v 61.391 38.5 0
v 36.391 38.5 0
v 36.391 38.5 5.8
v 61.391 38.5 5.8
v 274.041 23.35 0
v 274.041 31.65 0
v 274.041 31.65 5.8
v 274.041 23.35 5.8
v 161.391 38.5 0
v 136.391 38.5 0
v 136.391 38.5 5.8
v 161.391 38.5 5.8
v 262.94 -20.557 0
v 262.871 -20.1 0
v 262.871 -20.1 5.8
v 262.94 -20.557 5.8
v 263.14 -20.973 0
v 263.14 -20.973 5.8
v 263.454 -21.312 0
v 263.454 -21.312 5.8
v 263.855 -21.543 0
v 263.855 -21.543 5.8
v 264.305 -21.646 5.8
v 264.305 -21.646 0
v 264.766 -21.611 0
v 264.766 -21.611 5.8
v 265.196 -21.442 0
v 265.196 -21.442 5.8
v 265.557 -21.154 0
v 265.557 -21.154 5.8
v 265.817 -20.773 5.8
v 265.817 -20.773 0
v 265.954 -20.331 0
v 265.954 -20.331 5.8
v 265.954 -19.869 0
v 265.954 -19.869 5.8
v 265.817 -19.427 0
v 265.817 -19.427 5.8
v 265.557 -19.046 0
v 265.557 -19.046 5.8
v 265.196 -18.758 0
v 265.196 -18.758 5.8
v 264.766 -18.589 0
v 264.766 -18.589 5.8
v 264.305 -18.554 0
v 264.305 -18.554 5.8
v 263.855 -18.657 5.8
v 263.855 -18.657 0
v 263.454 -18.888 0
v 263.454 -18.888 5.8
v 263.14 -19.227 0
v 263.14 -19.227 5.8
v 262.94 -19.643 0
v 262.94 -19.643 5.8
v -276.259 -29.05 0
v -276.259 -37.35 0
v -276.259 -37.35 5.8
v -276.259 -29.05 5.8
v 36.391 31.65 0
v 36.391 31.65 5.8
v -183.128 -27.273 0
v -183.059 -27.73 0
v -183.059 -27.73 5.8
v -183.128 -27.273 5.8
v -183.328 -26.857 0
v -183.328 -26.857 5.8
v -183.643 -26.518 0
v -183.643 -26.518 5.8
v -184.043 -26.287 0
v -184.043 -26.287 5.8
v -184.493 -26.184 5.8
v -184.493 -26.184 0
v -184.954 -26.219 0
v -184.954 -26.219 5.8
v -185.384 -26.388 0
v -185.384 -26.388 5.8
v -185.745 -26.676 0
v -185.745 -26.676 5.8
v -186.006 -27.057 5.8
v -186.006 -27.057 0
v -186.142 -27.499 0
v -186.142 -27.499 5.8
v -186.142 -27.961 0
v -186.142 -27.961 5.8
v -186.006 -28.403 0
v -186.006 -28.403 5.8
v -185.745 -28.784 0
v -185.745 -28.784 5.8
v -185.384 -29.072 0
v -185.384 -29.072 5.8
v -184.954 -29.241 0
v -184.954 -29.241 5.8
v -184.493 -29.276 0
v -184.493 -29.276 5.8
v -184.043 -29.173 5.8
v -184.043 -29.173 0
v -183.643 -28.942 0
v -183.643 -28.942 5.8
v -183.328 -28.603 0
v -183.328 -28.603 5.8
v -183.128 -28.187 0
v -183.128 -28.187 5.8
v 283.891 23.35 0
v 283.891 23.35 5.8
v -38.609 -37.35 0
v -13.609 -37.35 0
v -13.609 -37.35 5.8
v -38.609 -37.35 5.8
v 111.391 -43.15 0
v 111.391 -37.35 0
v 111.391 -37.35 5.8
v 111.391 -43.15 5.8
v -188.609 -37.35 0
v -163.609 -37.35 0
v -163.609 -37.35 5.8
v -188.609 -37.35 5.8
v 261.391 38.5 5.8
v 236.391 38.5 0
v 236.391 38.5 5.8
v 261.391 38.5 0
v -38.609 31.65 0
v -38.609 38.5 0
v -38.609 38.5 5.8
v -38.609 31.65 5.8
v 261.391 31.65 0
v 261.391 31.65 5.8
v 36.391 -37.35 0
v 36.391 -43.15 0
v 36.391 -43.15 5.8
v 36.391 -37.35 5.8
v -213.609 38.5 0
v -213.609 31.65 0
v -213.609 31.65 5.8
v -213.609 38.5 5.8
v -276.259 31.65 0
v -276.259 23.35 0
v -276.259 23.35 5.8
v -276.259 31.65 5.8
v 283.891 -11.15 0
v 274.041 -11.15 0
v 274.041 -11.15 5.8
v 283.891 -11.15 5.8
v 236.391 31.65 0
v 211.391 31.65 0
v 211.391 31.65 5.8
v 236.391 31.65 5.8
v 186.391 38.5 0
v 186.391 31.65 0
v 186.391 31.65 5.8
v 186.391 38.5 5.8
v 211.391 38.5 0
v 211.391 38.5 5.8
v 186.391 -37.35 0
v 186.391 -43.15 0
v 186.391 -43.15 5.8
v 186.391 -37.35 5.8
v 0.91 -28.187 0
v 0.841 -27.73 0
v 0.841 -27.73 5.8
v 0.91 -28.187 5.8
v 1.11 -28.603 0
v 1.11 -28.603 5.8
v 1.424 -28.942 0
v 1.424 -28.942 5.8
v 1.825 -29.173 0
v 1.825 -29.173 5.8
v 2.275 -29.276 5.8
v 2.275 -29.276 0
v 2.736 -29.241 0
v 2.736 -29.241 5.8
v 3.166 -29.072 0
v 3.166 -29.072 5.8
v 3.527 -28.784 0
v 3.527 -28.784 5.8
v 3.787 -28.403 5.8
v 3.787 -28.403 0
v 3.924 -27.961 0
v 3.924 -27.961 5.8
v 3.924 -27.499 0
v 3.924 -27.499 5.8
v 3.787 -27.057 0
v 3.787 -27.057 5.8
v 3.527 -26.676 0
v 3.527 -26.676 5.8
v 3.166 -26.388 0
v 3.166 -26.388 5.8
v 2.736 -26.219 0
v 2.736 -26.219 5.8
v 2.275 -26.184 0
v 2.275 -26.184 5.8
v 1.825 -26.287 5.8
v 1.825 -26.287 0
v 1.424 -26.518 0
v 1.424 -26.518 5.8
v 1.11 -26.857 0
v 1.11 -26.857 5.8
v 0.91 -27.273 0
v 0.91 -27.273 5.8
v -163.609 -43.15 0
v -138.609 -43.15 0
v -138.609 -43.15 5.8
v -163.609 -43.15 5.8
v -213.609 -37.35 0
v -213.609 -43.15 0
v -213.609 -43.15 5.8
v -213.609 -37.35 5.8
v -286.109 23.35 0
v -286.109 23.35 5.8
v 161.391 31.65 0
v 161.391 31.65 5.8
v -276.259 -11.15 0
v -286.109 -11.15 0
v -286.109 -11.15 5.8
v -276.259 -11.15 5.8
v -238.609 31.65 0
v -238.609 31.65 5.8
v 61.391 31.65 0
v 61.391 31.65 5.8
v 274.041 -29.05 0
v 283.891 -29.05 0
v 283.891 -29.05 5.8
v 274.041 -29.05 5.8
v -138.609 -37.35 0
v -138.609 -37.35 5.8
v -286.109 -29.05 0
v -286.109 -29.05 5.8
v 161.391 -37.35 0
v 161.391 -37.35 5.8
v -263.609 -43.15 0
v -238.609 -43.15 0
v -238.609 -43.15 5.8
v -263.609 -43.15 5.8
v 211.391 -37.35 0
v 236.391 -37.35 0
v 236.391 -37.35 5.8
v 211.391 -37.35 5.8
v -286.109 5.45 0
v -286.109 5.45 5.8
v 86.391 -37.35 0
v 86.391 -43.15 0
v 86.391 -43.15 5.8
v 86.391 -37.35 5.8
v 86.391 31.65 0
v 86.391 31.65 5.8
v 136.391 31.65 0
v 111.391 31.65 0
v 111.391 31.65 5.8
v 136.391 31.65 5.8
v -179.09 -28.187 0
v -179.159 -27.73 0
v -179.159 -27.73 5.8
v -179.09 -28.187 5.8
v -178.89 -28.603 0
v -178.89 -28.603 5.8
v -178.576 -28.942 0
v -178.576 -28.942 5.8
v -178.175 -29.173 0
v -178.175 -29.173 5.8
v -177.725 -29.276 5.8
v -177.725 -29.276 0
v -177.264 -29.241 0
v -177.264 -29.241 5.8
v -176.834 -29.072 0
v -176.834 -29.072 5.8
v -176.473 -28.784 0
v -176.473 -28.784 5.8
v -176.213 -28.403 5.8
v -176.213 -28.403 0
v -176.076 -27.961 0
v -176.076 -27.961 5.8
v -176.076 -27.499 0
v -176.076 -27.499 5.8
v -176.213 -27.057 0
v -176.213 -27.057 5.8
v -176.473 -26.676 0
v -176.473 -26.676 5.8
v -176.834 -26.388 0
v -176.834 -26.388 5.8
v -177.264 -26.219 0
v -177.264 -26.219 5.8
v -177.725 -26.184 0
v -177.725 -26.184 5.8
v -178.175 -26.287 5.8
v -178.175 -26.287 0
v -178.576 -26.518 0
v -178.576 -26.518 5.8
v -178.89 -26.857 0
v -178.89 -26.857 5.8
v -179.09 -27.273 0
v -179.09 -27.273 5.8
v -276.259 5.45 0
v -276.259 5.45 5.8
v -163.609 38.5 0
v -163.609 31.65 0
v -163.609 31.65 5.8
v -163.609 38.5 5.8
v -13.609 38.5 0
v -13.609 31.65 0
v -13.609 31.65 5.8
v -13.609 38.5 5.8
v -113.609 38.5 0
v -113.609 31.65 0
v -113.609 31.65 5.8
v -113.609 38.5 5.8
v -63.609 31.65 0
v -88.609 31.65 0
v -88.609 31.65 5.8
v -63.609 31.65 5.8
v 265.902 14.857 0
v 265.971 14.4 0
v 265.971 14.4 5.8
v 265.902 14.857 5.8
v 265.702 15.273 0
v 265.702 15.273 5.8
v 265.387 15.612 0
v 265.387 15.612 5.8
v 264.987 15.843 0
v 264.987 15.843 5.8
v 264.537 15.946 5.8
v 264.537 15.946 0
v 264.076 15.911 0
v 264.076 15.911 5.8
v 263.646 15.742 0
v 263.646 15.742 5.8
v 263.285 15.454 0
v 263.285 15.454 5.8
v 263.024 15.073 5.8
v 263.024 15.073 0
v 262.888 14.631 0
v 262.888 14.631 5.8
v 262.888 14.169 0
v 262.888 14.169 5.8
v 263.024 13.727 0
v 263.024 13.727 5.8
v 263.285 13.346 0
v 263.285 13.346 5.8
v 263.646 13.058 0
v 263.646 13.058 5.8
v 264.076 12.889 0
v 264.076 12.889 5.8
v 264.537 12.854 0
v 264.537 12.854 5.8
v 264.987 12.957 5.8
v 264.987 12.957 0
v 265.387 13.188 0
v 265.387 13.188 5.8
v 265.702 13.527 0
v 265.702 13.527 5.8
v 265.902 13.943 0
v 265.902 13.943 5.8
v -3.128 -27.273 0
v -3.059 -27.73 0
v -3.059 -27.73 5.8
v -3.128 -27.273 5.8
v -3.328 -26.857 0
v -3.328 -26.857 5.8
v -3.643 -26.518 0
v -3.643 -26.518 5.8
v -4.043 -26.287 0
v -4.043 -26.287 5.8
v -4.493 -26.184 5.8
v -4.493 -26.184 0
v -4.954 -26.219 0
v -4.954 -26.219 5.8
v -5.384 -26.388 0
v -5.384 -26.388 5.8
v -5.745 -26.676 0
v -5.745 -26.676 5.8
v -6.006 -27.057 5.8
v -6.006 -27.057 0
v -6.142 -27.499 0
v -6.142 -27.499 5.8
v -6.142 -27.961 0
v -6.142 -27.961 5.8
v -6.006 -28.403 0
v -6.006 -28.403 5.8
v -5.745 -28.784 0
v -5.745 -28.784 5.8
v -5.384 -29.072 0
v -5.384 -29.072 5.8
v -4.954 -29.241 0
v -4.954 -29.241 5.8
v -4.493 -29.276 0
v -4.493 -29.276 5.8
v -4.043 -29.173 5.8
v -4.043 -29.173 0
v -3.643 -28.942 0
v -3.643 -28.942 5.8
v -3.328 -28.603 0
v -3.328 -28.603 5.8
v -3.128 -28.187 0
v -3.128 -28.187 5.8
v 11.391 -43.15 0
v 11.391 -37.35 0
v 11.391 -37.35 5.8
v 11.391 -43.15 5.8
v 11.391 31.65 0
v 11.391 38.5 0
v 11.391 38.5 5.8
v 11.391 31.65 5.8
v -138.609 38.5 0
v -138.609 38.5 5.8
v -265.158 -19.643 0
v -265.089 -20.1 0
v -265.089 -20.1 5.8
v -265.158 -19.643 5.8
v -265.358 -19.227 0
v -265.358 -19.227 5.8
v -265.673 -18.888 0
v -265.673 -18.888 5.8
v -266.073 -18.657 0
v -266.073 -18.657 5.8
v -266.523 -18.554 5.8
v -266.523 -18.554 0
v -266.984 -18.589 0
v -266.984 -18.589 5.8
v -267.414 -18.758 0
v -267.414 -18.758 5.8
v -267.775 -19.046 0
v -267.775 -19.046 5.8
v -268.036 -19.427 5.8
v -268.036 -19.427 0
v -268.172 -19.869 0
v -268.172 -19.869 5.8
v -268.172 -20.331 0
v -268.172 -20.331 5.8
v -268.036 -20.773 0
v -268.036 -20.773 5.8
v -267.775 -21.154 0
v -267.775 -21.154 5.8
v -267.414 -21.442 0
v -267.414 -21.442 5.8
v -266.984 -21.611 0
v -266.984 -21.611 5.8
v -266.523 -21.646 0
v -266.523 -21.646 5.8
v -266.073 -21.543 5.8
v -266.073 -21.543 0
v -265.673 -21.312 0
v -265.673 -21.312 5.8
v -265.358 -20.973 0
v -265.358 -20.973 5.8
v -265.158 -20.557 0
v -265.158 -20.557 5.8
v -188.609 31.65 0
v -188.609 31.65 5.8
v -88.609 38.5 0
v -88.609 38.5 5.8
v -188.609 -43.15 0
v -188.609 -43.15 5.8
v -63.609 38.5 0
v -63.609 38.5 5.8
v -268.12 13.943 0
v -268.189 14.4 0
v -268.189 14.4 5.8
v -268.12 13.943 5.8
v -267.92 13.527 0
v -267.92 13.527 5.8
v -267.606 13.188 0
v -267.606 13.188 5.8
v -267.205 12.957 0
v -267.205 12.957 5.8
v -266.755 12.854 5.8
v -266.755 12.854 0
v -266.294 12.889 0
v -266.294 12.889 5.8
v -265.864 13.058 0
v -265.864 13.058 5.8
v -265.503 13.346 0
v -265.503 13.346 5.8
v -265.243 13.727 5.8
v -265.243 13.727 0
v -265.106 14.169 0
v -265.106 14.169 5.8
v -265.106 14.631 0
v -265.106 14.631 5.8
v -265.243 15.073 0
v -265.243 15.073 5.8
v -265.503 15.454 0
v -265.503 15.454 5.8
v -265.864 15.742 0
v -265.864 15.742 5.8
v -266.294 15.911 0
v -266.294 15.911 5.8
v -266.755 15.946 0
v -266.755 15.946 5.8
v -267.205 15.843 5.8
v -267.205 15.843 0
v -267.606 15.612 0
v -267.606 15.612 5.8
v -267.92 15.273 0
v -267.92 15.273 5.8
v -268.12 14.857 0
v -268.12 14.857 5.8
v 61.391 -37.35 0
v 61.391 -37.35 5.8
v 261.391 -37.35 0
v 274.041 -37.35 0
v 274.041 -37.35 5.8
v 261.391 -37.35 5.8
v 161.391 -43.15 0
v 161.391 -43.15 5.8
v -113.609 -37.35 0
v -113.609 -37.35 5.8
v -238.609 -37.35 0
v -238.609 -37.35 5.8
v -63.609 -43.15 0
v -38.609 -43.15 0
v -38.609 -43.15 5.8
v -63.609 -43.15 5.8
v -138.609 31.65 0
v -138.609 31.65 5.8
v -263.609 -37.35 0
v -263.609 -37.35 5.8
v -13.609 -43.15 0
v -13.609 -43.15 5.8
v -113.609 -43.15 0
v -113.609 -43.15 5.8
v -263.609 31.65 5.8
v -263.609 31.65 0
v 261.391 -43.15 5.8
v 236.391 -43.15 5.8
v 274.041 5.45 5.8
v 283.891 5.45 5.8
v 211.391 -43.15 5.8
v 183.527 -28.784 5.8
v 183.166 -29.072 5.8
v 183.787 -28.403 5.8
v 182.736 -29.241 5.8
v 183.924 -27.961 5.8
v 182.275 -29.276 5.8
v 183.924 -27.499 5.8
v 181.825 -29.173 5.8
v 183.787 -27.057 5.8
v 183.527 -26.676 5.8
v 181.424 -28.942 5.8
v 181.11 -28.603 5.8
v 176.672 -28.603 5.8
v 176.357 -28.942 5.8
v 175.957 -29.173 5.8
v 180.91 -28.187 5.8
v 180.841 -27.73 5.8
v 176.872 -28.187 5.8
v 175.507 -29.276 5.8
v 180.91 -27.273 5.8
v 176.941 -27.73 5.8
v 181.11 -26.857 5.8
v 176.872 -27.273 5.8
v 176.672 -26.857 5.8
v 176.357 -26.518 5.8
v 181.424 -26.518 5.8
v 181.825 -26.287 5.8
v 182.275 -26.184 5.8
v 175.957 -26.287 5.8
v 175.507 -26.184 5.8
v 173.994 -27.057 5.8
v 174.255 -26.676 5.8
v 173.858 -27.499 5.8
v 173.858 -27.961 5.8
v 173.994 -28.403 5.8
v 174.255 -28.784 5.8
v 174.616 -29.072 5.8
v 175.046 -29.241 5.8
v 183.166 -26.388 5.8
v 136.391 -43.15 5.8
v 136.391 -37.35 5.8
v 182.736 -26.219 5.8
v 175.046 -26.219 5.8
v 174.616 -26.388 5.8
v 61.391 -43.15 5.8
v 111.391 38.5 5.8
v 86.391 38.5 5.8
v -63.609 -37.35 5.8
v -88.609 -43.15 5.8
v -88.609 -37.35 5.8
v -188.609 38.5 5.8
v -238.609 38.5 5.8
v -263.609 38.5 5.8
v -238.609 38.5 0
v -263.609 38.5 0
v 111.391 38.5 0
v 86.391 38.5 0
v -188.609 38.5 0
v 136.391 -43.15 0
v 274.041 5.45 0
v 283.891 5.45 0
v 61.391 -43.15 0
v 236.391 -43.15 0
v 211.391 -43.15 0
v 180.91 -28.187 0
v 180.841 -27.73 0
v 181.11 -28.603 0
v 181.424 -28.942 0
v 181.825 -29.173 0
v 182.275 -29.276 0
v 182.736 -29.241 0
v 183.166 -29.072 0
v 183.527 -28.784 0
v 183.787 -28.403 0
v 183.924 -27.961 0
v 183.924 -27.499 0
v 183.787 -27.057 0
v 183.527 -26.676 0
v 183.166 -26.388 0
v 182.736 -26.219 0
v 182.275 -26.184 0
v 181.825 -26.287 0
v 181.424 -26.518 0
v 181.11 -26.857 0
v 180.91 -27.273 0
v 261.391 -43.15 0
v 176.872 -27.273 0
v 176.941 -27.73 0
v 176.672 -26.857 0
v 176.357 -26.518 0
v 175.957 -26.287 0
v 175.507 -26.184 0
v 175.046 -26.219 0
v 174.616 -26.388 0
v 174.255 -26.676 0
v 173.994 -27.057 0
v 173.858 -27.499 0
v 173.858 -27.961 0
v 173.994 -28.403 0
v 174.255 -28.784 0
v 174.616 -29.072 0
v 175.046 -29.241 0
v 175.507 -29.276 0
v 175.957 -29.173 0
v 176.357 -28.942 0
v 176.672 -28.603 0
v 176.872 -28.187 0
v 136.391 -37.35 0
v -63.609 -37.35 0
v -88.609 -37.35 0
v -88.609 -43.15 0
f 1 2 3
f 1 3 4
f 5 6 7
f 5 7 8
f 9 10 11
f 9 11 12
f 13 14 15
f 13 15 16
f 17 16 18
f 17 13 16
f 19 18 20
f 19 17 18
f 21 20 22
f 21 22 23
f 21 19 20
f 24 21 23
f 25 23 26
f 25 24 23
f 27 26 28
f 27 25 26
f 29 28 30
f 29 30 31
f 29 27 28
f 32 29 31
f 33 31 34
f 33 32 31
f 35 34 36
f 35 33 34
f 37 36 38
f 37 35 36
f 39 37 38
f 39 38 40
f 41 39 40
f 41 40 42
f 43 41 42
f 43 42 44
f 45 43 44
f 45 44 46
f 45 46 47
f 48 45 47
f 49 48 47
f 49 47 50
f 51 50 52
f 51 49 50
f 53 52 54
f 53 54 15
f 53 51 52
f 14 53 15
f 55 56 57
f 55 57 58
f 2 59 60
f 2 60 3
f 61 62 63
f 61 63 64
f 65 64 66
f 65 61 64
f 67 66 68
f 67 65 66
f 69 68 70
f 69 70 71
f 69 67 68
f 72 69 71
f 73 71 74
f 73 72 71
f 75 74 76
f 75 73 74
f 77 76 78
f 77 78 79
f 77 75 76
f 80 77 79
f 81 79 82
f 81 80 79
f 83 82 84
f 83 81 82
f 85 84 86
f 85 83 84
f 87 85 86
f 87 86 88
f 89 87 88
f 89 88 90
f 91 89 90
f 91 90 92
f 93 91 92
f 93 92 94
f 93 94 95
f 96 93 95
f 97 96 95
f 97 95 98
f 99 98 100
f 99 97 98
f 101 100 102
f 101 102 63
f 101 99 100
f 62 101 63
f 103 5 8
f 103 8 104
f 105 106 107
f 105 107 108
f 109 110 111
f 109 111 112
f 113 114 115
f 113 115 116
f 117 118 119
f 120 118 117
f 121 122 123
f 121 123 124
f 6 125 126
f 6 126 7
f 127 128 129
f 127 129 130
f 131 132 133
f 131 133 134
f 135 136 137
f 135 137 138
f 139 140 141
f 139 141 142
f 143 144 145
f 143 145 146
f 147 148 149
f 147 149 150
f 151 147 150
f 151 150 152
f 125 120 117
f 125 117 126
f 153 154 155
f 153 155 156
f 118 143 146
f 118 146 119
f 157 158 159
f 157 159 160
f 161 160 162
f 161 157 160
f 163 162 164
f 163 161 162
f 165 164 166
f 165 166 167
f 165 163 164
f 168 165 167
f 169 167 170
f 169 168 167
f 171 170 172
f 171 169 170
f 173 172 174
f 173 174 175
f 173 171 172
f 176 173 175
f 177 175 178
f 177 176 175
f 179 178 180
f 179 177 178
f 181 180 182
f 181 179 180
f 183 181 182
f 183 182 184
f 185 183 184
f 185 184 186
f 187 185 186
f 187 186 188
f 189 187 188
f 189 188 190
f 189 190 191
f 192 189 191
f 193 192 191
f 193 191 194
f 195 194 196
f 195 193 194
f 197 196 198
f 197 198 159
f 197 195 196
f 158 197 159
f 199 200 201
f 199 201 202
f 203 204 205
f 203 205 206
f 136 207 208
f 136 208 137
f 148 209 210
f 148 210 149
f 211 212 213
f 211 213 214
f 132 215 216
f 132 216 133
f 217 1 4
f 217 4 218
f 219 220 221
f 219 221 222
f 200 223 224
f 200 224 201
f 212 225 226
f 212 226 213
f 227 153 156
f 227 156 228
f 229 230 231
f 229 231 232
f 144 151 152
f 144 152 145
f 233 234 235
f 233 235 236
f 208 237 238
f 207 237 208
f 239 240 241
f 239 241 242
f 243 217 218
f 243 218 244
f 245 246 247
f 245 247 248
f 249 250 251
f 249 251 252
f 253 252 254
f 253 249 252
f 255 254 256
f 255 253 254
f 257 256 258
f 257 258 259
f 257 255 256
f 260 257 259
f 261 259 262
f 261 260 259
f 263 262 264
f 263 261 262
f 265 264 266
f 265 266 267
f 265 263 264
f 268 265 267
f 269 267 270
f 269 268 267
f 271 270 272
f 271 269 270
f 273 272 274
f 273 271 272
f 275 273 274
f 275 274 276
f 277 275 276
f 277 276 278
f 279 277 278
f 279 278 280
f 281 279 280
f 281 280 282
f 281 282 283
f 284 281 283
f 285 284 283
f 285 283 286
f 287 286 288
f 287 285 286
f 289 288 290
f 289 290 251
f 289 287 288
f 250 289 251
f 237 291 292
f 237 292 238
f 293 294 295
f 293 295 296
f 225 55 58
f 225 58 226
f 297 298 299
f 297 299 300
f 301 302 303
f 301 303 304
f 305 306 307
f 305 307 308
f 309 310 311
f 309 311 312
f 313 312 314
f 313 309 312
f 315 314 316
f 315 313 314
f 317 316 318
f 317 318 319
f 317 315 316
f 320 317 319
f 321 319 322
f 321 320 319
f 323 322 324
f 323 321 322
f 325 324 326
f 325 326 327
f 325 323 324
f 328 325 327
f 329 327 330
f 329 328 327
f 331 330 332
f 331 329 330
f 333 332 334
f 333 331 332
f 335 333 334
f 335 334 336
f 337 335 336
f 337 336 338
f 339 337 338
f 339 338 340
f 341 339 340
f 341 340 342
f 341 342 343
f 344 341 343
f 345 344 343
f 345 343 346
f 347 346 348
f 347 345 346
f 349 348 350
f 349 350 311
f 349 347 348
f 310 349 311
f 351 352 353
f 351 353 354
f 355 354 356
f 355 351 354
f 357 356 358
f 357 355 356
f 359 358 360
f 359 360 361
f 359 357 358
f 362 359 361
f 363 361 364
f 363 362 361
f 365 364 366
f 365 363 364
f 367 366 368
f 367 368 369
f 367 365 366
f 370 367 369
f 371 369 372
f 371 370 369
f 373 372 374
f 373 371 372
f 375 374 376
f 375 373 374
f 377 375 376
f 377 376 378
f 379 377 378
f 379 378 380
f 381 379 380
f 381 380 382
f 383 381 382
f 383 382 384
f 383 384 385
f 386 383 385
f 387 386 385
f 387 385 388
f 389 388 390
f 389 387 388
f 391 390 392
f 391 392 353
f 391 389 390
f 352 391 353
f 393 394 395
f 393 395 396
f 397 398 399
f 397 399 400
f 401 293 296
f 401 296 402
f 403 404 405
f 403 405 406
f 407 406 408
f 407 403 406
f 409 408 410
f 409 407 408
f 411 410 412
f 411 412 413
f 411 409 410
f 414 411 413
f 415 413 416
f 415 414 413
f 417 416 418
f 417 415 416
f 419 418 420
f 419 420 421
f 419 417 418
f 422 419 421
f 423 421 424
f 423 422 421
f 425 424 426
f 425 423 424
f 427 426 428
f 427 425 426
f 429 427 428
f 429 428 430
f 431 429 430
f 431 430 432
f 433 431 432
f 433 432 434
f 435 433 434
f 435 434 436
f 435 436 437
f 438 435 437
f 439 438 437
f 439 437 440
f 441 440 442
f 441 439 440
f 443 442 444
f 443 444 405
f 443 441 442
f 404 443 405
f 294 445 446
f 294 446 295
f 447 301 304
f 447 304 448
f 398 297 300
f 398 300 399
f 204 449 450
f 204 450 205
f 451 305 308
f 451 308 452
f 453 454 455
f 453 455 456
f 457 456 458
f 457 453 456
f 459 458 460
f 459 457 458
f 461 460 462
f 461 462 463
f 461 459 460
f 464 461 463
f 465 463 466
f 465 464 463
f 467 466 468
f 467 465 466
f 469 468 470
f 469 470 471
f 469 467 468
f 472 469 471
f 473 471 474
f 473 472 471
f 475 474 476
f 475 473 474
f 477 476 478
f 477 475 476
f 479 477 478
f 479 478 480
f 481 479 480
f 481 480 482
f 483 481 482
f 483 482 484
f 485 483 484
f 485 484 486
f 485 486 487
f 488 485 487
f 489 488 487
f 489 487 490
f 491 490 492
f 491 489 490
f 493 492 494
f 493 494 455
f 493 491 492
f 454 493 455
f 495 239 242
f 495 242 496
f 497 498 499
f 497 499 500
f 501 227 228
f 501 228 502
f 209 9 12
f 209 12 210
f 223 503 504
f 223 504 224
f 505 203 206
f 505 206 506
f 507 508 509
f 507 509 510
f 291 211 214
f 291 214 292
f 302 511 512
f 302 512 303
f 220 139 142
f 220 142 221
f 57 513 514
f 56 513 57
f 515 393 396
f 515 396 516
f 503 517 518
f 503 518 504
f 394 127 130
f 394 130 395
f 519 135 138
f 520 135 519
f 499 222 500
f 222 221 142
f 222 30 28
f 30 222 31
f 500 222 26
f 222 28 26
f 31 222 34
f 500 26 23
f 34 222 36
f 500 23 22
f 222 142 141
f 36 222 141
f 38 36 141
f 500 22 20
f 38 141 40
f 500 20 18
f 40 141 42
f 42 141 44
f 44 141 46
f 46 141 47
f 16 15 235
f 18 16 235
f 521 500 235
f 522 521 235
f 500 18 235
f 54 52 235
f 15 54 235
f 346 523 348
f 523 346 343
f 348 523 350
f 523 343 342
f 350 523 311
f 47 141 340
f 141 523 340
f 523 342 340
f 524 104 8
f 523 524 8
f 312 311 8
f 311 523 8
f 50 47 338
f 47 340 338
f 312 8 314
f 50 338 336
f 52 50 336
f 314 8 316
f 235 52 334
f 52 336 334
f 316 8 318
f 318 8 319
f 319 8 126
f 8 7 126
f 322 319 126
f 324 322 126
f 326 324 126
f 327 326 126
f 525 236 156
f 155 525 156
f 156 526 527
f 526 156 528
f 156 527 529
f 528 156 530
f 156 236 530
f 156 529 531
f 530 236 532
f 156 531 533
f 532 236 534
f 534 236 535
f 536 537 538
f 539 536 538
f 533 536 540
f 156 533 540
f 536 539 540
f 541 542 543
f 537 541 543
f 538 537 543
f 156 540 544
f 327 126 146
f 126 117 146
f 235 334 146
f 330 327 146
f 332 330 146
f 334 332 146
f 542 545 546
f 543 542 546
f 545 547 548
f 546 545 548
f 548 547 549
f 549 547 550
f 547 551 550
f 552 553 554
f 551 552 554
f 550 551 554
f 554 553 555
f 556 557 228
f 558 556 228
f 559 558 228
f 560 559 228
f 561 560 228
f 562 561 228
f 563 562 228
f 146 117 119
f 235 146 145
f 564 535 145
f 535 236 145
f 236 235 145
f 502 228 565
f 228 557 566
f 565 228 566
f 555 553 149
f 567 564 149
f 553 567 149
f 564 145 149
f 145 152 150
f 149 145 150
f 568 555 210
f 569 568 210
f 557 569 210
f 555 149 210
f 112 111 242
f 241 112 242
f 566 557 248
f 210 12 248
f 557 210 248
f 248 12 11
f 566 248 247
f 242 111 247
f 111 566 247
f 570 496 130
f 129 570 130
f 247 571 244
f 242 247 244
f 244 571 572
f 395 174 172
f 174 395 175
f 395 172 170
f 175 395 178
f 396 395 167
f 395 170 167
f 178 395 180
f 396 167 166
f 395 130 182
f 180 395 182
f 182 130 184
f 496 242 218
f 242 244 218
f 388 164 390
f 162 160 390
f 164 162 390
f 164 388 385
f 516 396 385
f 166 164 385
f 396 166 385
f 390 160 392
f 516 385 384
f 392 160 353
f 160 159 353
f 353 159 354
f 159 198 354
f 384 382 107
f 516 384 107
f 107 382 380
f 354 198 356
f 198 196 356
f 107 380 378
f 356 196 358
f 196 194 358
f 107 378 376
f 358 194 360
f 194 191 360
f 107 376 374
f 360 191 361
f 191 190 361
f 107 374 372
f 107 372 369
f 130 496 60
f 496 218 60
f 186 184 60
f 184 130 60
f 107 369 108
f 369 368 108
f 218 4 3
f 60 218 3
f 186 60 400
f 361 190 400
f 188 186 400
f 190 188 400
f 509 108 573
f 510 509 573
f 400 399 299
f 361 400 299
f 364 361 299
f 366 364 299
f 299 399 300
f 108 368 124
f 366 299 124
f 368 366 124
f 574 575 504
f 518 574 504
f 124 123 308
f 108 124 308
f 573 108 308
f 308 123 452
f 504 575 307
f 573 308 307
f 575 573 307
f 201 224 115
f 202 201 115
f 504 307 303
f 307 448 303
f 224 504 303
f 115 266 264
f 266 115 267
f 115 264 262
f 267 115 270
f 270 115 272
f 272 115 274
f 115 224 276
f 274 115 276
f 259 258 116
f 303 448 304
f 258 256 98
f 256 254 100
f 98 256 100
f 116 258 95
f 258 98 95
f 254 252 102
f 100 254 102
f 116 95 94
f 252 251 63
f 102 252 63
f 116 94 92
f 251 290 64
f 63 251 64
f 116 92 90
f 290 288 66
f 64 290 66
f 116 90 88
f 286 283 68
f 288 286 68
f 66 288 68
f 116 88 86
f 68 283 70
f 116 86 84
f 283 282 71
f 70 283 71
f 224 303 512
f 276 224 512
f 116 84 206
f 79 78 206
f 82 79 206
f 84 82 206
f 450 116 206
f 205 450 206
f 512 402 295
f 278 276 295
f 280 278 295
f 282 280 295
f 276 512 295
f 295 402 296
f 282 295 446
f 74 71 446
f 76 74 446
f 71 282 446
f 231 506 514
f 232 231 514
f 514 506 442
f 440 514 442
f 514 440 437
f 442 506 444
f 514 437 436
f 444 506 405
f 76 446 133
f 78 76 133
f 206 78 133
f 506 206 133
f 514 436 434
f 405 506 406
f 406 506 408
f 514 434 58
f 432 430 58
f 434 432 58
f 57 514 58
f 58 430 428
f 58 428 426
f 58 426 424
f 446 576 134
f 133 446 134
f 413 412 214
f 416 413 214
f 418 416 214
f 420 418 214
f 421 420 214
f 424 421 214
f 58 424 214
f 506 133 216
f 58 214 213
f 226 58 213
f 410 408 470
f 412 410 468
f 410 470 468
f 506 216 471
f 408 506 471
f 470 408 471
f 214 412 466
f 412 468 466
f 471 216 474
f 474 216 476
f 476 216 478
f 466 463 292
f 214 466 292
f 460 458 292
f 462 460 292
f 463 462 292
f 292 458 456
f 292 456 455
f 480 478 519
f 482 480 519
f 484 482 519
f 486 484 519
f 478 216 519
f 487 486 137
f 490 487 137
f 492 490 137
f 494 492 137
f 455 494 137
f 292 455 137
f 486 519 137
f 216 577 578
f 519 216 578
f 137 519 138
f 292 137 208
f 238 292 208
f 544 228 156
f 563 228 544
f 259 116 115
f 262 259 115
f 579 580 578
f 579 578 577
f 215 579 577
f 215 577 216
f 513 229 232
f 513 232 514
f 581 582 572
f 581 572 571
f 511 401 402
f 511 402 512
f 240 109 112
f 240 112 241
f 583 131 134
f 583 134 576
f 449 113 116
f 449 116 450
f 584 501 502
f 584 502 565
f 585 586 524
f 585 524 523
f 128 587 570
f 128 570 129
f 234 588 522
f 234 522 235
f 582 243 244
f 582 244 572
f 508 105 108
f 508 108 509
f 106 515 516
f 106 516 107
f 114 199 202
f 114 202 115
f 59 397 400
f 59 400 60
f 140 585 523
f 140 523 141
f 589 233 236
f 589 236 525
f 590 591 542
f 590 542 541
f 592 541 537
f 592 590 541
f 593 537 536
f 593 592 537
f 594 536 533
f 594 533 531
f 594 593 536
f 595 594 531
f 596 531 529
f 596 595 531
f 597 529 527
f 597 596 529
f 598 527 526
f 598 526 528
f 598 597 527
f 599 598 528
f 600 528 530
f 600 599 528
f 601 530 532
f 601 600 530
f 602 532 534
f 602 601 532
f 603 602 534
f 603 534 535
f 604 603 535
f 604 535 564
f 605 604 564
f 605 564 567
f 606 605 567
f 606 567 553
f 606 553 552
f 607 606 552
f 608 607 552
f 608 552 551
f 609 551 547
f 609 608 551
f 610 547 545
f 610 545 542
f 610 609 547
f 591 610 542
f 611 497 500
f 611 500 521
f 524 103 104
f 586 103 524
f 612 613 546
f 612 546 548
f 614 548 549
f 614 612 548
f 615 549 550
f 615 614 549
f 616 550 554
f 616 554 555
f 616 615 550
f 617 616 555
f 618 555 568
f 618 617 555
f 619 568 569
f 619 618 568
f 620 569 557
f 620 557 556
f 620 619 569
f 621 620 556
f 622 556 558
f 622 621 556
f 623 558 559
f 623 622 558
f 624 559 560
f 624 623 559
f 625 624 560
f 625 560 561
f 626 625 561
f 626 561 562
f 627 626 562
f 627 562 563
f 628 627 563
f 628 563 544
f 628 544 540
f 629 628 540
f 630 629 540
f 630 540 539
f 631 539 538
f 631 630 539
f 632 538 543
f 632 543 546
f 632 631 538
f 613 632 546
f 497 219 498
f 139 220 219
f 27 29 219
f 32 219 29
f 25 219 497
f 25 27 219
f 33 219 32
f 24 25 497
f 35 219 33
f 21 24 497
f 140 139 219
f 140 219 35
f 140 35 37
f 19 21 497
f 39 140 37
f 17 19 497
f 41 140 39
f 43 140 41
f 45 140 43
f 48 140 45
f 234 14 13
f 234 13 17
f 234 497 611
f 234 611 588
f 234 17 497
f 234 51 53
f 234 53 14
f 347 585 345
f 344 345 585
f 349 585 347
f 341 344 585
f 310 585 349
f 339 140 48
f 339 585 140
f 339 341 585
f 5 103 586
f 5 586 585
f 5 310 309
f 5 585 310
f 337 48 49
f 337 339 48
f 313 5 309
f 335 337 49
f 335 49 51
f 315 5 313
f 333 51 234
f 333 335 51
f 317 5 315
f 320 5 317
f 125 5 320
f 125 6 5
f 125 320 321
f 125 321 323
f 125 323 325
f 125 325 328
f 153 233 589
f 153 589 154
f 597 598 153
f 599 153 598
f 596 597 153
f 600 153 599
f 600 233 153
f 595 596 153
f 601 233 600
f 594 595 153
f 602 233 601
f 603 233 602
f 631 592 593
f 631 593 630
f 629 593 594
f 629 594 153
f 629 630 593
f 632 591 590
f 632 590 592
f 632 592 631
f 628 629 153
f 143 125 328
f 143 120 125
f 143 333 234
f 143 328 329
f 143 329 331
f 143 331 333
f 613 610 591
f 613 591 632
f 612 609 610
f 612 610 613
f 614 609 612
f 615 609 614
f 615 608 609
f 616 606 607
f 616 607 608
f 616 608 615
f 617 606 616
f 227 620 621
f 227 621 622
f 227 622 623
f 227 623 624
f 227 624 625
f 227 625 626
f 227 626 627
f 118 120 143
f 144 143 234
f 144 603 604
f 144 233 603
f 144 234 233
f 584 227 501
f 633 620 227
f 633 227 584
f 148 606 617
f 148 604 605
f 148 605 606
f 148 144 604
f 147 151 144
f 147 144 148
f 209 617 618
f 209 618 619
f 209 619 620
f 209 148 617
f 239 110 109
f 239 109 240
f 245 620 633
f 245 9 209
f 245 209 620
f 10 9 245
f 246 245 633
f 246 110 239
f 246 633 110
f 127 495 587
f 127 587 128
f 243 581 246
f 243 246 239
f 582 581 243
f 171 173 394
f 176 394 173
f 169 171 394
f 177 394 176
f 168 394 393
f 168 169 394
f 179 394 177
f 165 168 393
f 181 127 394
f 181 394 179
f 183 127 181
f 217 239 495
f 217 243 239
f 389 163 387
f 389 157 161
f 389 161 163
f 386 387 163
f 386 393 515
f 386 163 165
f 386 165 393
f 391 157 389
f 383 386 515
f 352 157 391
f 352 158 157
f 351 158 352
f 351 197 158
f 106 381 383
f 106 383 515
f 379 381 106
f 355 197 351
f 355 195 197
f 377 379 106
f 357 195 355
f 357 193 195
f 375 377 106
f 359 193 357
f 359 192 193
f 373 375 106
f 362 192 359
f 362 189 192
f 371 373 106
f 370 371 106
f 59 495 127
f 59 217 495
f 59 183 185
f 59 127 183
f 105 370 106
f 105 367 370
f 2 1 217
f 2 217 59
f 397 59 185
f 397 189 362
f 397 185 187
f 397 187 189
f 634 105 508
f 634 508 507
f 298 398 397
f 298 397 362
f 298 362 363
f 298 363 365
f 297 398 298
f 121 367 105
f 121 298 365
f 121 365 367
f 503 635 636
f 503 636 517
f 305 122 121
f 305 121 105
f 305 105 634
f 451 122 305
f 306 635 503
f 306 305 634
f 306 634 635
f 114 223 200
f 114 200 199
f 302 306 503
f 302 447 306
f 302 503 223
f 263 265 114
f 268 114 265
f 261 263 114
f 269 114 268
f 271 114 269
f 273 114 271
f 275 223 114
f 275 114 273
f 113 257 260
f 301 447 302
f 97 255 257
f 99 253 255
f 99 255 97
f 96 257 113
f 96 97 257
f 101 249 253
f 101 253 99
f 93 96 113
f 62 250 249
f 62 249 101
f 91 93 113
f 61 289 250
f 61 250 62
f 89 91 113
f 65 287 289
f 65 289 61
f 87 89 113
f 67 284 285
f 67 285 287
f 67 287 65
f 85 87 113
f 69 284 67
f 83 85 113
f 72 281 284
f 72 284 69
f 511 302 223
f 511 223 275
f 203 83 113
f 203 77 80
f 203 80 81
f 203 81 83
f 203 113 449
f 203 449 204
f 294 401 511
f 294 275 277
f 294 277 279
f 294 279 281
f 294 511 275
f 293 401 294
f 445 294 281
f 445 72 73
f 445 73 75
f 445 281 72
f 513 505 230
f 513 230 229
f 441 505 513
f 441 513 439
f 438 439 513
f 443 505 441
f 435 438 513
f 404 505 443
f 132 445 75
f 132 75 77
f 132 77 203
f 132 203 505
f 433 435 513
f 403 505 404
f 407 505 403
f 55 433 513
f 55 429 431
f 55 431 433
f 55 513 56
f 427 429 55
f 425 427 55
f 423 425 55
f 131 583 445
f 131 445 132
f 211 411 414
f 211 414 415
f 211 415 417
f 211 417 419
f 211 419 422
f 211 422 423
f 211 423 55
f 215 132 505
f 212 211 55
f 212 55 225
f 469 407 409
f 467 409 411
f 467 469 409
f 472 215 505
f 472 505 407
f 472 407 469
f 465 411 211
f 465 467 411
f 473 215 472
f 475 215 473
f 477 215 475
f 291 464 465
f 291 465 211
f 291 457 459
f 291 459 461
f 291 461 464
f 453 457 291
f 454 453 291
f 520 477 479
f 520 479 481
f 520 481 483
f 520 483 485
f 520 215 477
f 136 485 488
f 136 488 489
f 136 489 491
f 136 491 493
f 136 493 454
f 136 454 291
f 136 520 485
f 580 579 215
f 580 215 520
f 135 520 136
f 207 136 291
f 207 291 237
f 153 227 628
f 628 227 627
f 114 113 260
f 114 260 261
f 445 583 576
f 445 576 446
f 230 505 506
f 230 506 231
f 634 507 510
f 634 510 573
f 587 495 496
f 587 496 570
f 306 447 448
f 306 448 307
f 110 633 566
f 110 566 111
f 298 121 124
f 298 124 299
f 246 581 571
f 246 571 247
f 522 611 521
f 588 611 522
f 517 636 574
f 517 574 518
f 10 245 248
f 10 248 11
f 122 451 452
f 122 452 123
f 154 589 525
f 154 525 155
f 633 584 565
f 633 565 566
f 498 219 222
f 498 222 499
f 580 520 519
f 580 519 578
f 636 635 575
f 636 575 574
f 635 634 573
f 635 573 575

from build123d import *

# Parameters (mm, degrees)
SKETCH1_R           = 1.55
BOSS_EXTRUDE1_DEPTH = 5.8


with BuildPart() as part:
    # Sketch1 → Boss-Extrude1 (new body)
    with BuildSketch(Plane.XY):
        Polygon((-213.609090909, 31.65), (-213.609090909, 38.5), (-188.609090909, 38.5), (-188.609090909, 31.65), (-163.609090909, 31.65), (-163.609090909, 38.5), (-138.609090909, 38.5), (-138.609090909, 31.65), (-113.609090909, 31.65), (-113.609090909, 38.5), (-88.609090909, 38.5), (-88.609090909, 31.65), (-63.609090909, 31.65), (-63.609090909, 38.5), (-38.609090909, 38.5), (-38.609090909, 31.65), (-13.609090909, 31.65), (-13.609090909, 38.5), (11.390909091, 38.5), (11.390909091, 31.65), (36.390909091, 31.65), (36.390909091, 38.5), (61.390909091, 38.5), (61.390909091, 31.65), (86.390909091, 31.65), (86.390909091, 38.5), (111.390909091, 38.5), (111.390909091, 31.65), (136.390909091, 31.65), (136.390909091, 38.5), (161.390909091, 38.5), (161.390909091, 31.65), (186.390909091, 31.65), (186.390909091, 38.5), (211.390909091, 38.5), (211.390909091, 31.65), (236.390909091, 31.65), (236.390909091, 38.5), (261.390909091, 38.5), (261.390909091, 31.65), (274.040909091, 31.65), (274.040909091, 23.35), (283.890909091, 23.35), (283.890909091, 5.45), (274.040909091, 5.45), (274.040909091, -11.15), (283.890909091, -11.15), (283.890909091, -29.05), (274.040909091, -29.05), (274.040909091, -37.35), (261.390909091, -37.35), (261.390909091, -43.15), (236.390909091, -43.15), (236.390909091, -37.35), (211.390909091, -37.35), (211.390909091, -43.15), (186.390909091, -43.15), (186.390909091, -37.35), (161.390909091, -37.35), (161.390909091, -43.15), (136.390909091, -43.15), (136.390909091, -37.35), (111.390909091, -37.35), (111.390909091, -43.15), (86.390909091, -43.15), (86.390909091, -37.35), (61.390909091, -37.35), (61.390909091, -43.15), (36.390909091, -43.15), (36.390909091, -37.35), (11.390909091, -37.35), (11.390909091, -43.15), (-13.609090909, -43.15), (-13.609090909, -37.35), (-38.609090909, -37.35), (-38.609090909, -43.15), (-63.609090909, -43.15), (-63.609090909, -37.35), (-88.609090909, -37.35), (-88.609090909, -43.15), (-113.609090909, -43.15), (-113.609090909, -37.35), (-138.609090909, -37.35), (-138.609090909, -43.15), (-163.609090909, -43.15), (-163.609090909, -37.35), (-188.609090909, -37.35), (-188.609090909, -43.15), (-213.609090909, -43.15), (-213.609090909, -37.35), (-238.609090909, -37.35), (-238.609090909, -43.15), (-263.609090909, -43.15), (-263.609090909, -37.35), (-276.259090909, -37.35), (-276.259090909, -29.05), (-286.109090909, -29.05), (-286.109090909, -11.15), (-276.259090909, -11.15), (-276.259090909, 5.45), (-286.109090909, 5.45), (-286.109090909, 23.35), (-276.259090909, 23.35), (-276.259090909, 31.65), (-263.609090909, 31.65), (-263.609090909, 38.5), (-238.609090909, 38.5), (-238.609090909, 31.65), align=None)
        with Locations((-266.639090909, -20.1)):
            Circle(SKETCH1_R, mode=Mode.SUBTRACT)
        with Locations((-266.639090909, 14.4)):
            Circle(SKETCH1_R, mode=Mode.SUBTRACT)
        with Locations((264.420909091, 14.4)):
            Circle(SKETCH1_R, mode=Mode.SUBTRACT)
        with Locations((264.420909091, -20.1)):
            Circle(SKETCH1_R, mode=Mode.SUBTRACT)
        with Locations((-4.609090909, -27.73)):
            Circle(SKETCH1_R, mode=Mode.SUBTRACT)
        with Locations((2.390909091, -27.73)):
            Circle(SKETCH1_R, mode=Mode.SUBTRACT)
        with Locations((175.390909091, -27.73)):
            Circle(SKETCH1_R, mode=Mode.SUBTRACT)
        with Locations((182.390909091, -27.73)):
            Circle(SKETCH1_R, mode=Mode.SUBTRACT)
        with Locations((-184.609090909, -27.73)):
            Circle(SKETCH1_R, mode=Mode.SUBTRACT)
        with Locations((-177.609090909, -27.73)):
            Circle(SKETCH1_R, mode=Mode.SUBTRACT)
    extrude(amount=BOSS_EXTRUDE1_DEPTH)


solid = part.part
